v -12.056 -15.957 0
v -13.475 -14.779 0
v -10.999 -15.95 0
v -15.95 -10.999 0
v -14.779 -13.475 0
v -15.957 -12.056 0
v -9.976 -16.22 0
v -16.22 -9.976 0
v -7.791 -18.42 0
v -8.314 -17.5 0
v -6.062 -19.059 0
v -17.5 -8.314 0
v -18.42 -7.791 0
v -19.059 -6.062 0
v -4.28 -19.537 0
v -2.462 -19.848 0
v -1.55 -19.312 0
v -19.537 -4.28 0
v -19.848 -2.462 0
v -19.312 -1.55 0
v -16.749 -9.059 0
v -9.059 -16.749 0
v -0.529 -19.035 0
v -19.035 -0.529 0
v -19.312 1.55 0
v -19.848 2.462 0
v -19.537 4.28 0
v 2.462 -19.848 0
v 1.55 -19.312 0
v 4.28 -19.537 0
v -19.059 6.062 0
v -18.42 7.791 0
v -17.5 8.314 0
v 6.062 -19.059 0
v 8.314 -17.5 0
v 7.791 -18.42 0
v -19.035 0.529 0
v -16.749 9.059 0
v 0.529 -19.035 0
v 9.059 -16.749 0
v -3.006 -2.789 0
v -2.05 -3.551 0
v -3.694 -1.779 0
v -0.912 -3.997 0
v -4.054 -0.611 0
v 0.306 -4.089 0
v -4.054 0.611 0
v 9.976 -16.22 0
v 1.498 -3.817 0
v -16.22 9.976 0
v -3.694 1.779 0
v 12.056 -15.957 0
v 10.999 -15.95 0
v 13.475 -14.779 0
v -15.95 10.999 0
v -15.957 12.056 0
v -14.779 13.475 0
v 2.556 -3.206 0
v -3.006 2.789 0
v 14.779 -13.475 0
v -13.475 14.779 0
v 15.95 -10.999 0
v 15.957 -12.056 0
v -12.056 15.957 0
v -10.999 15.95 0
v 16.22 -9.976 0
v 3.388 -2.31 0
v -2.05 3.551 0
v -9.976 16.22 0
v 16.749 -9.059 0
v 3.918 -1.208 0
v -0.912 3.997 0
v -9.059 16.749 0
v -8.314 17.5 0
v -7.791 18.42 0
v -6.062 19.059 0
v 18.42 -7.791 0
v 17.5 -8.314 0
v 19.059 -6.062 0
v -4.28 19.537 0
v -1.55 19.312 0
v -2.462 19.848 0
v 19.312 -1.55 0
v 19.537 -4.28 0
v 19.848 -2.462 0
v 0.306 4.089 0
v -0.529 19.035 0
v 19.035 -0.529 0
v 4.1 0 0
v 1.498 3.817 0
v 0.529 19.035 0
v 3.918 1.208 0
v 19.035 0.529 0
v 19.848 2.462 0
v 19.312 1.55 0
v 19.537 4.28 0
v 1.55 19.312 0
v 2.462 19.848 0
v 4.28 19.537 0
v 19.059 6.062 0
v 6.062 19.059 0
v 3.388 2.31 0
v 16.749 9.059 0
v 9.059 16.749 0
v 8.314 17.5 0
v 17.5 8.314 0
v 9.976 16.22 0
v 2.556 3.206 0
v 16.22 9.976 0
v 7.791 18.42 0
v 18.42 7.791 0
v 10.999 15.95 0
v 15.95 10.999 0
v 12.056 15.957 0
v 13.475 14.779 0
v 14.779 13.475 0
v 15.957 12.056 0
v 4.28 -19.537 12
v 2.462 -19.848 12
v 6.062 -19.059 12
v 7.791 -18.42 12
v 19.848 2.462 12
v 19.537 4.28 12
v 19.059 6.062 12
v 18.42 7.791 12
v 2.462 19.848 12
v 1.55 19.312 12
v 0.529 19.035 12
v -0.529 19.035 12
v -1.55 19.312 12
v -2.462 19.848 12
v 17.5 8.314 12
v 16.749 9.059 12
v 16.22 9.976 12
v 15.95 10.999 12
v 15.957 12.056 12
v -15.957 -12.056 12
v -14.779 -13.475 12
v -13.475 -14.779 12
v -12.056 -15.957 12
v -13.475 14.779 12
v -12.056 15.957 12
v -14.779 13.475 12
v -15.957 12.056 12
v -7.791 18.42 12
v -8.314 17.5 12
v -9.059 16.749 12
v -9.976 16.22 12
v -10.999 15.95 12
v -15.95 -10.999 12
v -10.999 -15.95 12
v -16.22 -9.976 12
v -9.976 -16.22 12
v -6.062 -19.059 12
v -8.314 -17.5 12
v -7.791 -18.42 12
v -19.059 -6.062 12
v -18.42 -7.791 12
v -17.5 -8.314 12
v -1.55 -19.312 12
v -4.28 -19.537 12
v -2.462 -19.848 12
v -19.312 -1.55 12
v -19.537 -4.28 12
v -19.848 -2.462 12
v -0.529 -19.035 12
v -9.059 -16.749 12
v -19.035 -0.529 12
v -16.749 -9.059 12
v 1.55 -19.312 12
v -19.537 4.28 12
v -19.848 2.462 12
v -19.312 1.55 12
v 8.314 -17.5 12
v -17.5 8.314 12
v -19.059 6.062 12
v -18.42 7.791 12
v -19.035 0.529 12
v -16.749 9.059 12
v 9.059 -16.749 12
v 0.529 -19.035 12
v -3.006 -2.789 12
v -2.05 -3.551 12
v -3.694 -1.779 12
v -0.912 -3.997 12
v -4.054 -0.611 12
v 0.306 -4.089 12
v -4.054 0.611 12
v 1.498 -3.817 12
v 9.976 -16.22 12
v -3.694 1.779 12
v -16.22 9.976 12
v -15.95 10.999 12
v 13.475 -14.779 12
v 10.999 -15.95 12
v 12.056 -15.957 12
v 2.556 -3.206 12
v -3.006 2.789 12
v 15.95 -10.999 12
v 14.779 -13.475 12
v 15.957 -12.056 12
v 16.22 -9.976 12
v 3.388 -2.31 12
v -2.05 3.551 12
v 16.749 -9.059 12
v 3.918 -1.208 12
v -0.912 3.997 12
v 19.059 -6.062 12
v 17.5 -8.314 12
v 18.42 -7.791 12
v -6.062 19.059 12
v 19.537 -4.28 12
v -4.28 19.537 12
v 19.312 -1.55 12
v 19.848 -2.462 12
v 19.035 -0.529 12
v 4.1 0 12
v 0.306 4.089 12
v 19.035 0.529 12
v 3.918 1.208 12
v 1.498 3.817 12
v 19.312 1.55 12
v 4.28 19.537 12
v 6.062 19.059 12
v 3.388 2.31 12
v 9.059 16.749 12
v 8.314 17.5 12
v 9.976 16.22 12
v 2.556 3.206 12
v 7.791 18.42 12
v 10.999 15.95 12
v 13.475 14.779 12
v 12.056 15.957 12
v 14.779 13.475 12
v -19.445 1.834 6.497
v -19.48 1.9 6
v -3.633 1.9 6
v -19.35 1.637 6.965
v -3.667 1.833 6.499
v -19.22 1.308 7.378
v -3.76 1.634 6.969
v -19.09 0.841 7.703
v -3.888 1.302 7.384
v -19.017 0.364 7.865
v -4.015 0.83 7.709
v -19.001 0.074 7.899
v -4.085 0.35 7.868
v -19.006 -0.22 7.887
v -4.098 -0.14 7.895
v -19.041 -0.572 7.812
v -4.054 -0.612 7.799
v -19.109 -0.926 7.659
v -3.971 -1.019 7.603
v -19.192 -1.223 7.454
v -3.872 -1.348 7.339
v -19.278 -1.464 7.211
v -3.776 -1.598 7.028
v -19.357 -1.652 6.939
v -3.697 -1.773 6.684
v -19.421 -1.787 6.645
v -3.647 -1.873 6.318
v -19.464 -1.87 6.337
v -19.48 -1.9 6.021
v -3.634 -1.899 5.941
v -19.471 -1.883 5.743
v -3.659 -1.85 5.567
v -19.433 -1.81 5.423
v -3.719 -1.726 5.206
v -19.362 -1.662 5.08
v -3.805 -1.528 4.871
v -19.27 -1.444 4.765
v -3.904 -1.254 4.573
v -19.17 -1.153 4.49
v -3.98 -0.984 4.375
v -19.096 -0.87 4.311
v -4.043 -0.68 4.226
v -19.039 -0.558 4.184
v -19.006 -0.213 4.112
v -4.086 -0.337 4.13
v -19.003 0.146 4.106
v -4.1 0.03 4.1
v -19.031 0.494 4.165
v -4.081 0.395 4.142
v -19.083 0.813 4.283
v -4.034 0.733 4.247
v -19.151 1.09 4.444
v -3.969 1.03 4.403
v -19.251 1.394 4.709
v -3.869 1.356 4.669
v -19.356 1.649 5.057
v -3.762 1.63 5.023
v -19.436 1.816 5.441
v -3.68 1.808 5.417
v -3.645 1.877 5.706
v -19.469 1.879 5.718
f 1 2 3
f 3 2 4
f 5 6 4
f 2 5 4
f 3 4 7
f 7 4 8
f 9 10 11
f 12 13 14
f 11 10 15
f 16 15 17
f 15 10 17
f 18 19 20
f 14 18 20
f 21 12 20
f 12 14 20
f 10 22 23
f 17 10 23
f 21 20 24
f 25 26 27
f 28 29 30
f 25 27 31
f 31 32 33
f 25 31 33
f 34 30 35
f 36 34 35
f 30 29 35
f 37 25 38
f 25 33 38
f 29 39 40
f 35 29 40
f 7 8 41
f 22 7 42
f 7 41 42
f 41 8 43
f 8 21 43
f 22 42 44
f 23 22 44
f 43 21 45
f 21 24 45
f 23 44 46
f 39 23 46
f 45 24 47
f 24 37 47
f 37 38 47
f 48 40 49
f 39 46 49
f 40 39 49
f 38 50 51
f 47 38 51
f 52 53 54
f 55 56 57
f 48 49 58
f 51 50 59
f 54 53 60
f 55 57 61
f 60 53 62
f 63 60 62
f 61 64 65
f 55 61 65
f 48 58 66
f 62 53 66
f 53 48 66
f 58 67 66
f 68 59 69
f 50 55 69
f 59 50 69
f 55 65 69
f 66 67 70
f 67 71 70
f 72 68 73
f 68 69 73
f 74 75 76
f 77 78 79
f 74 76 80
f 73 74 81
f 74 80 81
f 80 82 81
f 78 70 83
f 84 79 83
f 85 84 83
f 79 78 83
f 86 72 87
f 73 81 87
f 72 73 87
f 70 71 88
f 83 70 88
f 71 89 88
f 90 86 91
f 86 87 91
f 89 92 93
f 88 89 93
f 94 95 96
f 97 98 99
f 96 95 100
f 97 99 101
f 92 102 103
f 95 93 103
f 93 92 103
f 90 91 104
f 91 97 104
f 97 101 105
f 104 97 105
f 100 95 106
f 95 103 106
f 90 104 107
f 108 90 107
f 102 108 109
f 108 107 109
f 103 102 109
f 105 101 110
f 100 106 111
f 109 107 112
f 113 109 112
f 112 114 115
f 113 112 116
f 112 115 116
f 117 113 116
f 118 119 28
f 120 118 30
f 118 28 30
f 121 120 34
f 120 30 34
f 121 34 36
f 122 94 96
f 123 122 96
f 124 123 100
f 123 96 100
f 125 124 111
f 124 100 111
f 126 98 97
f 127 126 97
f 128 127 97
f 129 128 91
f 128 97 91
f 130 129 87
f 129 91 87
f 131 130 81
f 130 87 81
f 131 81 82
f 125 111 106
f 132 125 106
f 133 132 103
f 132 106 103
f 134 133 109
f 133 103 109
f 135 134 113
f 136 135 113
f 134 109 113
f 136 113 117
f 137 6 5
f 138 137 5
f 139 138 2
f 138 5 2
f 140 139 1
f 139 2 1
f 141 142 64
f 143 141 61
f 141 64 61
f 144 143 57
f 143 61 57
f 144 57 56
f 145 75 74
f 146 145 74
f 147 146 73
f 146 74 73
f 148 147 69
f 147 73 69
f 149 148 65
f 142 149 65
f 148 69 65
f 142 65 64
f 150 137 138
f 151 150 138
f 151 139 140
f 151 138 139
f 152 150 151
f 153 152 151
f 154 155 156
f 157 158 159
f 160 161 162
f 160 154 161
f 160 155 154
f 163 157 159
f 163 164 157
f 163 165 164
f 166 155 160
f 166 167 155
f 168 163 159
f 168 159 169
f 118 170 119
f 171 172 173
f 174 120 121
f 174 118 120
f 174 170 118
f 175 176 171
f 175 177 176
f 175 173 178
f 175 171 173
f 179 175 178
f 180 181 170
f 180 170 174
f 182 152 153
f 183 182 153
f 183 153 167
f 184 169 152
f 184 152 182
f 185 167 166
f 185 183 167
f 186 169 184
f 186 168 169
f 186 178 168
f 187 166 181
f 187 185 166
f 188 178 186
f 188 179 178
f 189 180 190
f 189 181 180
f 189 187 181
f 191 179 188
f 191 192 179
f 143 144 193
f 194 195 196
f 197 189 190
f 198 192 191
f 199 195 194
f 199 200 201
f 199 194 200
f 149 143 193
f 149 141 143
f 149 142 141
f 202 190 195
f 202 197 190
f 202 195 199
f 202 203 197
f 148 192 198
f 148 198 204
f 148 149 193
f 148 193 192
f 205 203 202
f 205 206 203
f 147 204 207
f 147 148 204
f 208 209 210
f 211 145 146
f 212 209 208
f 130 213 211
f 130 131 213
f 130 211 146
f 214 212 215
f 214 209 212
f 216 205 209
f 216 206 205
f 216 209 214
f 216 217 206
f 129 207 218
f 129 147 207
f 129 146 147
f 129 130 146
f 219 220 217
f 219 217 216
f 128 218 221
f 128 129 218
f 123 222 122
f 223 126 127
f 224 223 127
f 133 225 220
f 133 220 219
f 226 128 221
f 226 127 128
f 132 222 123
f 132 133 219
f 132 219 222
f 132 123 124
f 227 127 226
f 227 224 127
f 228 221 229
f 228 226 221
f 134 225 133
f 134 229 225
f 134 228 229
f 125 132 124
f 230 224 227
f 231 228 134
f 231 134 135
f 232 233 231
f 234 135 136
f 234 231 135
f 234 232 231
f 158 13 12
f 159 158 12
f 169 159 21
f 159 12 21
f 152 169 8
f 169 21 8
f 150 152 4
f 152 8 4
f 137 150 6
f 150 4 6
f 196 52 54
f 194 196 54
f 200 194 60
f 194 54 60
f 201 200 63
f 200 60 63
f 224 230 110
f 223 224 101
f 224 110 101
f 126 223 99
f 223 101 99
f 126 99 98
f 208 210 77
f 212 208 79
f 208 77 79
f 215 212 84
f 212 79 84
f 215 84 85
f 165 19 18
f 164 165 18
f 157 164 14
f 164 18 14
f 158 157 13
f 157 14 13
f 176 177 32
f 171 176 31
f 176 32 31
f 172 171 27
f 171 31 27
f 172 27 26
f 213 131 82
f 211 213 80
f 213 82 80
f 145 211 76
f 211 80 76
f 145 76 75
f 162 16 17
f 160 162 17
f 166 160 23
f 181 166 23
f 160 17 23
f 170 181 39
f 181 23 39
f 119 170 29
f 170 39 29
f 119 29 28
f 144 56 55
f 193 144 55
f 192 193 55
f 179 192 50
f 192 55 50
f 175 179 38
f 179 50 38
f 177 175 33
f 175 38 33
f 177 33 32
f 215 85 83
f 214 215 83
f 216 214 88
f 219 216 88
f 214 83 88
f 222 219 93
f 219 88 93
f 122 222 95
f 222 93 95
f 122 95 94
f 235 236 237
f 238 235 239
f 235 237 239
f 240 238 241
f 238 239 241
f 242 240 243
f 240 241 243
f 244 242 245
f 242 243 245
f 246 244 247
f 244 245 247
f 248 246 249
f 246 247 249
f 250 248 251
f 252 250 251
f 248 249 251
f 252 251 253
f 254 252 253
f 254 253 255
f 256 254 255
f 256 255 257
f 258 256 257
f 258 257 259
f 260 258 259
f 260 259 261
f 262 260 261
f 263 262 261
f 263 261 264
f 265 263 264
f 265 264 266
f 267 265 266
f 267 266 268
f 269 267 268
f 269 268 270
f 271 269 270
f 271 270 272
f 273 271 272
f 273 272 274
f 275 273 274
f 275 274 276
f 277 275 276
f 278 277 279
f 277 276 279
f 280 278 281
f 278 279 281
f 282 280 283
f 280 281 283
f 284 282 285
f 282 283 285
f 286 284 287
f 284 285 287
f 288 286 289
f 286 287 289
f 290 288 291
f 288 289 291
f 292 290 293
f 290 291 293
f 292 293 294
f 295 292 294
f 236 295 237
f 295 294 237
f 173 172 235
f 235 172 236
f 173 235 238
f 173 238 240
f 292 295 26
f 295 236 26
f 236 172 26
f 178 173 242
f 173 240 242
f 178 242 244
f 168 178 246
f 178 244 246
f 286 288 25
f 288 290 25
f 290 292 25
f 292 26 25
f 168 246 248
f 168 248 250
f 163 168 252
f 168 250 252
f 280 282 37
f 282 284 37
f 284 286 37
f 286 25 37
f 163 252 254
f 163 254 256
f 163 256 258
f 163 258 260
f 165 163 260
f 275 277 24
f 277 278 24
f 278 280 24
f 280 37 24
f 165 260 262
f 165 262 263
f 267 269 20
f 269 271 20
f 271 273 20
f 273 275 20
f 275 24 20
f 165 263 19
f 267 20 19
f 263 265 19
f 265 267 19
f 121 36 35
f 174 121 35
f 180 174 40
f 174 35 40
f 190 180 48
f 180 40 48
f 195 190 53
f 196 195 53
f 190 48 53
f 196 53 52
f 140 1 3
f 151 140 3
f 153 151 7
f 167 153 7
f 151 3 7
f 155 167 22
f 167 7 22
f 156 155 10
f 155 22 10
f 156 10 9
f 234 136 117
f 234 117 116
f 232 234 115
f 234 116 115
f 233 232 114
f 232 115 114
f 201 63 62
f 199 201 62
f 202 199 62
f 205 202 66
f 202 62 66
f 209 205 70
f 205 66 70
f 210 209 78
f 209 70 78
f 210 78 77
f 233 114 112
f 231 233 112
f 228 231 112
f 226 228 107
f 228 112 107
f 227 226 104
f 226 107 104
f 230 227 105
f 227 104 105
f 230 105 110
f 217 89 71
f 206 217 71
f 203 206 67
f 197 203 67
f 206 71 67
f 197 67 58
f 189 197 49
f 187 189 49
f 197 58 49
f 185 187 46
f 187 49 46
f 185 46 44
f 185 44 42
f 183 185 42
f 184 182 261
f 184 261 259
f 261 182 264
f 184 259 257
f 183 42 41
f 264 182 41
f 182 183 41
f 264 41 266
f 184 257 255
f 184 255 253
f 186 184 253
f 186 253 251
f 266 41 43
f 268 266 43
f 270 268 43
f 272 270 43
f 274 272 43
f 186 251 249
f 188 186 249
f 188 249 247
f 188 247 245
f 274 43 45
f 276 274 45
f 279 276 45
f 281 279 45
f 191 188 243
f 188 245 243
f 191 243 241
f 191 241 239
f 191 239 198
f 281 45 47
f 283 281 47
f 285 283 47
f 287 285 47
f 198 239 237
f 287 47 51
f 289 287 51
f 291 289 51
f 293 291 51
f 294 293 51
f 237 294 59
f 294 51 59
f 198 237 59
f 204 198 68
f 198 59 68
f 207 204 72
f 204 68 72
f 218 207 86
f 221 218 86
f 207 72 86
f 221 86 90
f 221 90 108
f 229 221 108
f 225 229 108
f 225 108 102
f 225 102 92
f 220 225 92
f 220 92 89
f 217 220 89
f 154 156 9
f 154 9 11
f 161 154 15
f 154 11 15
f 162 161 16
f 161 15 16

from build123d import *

# Parameters (mm, degrees)
SKETCH_R           = 20
PAD_DEPTH          = 12
SKETCH001_R        = 4
POCKET_DEPTH       = 127.655658
POLARPATTERN_COUNT = 12
SKETCH002_R        = 4.1
POCKET001_DEPTH    = 12.001
SKETCH003_R        = 1.9
POCKET002_DEPTH    = 26


with BuildPart() as part:
    # Sketch → Pad (new body)
    with BuildSketch(Plane.XY):
        Circle(SKETCH_R)
    extrude(amount=PAD_DEPTH)

    # Sketch001 (on Face2 of Pad) → Pocket (cut, through all)
    with BuildSketch(Plane(origin=(0, 0, 0), x_dir=(1, 0, 0), z_dir=(0, 0, -1))):
        with Locations((0, 23)):
            Circle(SKETCH001_R)
    pocket = extrude(amount=-POCKET_DEPTH, mode=Mode.SUBTRACT)

    # PolarPattern: Pocket ×12 about axis
    polarpattern_axis = Axis((0, 0, 0), (0, 0, -1))
    for i in range(1, POLARPATTERN_COUNT):
        add(pocket.rotate(polarpattern_axis, i * 360 / POLARPATTERN_COUNT), mode=Mode.SUBTRACT)

    # Sketch002 (on Face2 of PolarPattern) → Pocket001 (cut, through all)
    with BuildSketch(Plane(origin=(0, 0, 0), x_dir=(1, 0, 0), z_dir=(0, 0, -1))):
        Circle(SKETCH002_R)
    extrude(amount=-POCKET001_DEPTH, mode=Mode.SUBTRACT)

    # Sketch003 → Pocket002 (cut)
    with BuildSketch(Plane.YZ):
        with Locations((0, 6)):
            Circle(SKETCH003_R)
    extrude(amount=-POCKET002_DEPTH, mode=Mode.SUBTRACT)


solid = part.part
